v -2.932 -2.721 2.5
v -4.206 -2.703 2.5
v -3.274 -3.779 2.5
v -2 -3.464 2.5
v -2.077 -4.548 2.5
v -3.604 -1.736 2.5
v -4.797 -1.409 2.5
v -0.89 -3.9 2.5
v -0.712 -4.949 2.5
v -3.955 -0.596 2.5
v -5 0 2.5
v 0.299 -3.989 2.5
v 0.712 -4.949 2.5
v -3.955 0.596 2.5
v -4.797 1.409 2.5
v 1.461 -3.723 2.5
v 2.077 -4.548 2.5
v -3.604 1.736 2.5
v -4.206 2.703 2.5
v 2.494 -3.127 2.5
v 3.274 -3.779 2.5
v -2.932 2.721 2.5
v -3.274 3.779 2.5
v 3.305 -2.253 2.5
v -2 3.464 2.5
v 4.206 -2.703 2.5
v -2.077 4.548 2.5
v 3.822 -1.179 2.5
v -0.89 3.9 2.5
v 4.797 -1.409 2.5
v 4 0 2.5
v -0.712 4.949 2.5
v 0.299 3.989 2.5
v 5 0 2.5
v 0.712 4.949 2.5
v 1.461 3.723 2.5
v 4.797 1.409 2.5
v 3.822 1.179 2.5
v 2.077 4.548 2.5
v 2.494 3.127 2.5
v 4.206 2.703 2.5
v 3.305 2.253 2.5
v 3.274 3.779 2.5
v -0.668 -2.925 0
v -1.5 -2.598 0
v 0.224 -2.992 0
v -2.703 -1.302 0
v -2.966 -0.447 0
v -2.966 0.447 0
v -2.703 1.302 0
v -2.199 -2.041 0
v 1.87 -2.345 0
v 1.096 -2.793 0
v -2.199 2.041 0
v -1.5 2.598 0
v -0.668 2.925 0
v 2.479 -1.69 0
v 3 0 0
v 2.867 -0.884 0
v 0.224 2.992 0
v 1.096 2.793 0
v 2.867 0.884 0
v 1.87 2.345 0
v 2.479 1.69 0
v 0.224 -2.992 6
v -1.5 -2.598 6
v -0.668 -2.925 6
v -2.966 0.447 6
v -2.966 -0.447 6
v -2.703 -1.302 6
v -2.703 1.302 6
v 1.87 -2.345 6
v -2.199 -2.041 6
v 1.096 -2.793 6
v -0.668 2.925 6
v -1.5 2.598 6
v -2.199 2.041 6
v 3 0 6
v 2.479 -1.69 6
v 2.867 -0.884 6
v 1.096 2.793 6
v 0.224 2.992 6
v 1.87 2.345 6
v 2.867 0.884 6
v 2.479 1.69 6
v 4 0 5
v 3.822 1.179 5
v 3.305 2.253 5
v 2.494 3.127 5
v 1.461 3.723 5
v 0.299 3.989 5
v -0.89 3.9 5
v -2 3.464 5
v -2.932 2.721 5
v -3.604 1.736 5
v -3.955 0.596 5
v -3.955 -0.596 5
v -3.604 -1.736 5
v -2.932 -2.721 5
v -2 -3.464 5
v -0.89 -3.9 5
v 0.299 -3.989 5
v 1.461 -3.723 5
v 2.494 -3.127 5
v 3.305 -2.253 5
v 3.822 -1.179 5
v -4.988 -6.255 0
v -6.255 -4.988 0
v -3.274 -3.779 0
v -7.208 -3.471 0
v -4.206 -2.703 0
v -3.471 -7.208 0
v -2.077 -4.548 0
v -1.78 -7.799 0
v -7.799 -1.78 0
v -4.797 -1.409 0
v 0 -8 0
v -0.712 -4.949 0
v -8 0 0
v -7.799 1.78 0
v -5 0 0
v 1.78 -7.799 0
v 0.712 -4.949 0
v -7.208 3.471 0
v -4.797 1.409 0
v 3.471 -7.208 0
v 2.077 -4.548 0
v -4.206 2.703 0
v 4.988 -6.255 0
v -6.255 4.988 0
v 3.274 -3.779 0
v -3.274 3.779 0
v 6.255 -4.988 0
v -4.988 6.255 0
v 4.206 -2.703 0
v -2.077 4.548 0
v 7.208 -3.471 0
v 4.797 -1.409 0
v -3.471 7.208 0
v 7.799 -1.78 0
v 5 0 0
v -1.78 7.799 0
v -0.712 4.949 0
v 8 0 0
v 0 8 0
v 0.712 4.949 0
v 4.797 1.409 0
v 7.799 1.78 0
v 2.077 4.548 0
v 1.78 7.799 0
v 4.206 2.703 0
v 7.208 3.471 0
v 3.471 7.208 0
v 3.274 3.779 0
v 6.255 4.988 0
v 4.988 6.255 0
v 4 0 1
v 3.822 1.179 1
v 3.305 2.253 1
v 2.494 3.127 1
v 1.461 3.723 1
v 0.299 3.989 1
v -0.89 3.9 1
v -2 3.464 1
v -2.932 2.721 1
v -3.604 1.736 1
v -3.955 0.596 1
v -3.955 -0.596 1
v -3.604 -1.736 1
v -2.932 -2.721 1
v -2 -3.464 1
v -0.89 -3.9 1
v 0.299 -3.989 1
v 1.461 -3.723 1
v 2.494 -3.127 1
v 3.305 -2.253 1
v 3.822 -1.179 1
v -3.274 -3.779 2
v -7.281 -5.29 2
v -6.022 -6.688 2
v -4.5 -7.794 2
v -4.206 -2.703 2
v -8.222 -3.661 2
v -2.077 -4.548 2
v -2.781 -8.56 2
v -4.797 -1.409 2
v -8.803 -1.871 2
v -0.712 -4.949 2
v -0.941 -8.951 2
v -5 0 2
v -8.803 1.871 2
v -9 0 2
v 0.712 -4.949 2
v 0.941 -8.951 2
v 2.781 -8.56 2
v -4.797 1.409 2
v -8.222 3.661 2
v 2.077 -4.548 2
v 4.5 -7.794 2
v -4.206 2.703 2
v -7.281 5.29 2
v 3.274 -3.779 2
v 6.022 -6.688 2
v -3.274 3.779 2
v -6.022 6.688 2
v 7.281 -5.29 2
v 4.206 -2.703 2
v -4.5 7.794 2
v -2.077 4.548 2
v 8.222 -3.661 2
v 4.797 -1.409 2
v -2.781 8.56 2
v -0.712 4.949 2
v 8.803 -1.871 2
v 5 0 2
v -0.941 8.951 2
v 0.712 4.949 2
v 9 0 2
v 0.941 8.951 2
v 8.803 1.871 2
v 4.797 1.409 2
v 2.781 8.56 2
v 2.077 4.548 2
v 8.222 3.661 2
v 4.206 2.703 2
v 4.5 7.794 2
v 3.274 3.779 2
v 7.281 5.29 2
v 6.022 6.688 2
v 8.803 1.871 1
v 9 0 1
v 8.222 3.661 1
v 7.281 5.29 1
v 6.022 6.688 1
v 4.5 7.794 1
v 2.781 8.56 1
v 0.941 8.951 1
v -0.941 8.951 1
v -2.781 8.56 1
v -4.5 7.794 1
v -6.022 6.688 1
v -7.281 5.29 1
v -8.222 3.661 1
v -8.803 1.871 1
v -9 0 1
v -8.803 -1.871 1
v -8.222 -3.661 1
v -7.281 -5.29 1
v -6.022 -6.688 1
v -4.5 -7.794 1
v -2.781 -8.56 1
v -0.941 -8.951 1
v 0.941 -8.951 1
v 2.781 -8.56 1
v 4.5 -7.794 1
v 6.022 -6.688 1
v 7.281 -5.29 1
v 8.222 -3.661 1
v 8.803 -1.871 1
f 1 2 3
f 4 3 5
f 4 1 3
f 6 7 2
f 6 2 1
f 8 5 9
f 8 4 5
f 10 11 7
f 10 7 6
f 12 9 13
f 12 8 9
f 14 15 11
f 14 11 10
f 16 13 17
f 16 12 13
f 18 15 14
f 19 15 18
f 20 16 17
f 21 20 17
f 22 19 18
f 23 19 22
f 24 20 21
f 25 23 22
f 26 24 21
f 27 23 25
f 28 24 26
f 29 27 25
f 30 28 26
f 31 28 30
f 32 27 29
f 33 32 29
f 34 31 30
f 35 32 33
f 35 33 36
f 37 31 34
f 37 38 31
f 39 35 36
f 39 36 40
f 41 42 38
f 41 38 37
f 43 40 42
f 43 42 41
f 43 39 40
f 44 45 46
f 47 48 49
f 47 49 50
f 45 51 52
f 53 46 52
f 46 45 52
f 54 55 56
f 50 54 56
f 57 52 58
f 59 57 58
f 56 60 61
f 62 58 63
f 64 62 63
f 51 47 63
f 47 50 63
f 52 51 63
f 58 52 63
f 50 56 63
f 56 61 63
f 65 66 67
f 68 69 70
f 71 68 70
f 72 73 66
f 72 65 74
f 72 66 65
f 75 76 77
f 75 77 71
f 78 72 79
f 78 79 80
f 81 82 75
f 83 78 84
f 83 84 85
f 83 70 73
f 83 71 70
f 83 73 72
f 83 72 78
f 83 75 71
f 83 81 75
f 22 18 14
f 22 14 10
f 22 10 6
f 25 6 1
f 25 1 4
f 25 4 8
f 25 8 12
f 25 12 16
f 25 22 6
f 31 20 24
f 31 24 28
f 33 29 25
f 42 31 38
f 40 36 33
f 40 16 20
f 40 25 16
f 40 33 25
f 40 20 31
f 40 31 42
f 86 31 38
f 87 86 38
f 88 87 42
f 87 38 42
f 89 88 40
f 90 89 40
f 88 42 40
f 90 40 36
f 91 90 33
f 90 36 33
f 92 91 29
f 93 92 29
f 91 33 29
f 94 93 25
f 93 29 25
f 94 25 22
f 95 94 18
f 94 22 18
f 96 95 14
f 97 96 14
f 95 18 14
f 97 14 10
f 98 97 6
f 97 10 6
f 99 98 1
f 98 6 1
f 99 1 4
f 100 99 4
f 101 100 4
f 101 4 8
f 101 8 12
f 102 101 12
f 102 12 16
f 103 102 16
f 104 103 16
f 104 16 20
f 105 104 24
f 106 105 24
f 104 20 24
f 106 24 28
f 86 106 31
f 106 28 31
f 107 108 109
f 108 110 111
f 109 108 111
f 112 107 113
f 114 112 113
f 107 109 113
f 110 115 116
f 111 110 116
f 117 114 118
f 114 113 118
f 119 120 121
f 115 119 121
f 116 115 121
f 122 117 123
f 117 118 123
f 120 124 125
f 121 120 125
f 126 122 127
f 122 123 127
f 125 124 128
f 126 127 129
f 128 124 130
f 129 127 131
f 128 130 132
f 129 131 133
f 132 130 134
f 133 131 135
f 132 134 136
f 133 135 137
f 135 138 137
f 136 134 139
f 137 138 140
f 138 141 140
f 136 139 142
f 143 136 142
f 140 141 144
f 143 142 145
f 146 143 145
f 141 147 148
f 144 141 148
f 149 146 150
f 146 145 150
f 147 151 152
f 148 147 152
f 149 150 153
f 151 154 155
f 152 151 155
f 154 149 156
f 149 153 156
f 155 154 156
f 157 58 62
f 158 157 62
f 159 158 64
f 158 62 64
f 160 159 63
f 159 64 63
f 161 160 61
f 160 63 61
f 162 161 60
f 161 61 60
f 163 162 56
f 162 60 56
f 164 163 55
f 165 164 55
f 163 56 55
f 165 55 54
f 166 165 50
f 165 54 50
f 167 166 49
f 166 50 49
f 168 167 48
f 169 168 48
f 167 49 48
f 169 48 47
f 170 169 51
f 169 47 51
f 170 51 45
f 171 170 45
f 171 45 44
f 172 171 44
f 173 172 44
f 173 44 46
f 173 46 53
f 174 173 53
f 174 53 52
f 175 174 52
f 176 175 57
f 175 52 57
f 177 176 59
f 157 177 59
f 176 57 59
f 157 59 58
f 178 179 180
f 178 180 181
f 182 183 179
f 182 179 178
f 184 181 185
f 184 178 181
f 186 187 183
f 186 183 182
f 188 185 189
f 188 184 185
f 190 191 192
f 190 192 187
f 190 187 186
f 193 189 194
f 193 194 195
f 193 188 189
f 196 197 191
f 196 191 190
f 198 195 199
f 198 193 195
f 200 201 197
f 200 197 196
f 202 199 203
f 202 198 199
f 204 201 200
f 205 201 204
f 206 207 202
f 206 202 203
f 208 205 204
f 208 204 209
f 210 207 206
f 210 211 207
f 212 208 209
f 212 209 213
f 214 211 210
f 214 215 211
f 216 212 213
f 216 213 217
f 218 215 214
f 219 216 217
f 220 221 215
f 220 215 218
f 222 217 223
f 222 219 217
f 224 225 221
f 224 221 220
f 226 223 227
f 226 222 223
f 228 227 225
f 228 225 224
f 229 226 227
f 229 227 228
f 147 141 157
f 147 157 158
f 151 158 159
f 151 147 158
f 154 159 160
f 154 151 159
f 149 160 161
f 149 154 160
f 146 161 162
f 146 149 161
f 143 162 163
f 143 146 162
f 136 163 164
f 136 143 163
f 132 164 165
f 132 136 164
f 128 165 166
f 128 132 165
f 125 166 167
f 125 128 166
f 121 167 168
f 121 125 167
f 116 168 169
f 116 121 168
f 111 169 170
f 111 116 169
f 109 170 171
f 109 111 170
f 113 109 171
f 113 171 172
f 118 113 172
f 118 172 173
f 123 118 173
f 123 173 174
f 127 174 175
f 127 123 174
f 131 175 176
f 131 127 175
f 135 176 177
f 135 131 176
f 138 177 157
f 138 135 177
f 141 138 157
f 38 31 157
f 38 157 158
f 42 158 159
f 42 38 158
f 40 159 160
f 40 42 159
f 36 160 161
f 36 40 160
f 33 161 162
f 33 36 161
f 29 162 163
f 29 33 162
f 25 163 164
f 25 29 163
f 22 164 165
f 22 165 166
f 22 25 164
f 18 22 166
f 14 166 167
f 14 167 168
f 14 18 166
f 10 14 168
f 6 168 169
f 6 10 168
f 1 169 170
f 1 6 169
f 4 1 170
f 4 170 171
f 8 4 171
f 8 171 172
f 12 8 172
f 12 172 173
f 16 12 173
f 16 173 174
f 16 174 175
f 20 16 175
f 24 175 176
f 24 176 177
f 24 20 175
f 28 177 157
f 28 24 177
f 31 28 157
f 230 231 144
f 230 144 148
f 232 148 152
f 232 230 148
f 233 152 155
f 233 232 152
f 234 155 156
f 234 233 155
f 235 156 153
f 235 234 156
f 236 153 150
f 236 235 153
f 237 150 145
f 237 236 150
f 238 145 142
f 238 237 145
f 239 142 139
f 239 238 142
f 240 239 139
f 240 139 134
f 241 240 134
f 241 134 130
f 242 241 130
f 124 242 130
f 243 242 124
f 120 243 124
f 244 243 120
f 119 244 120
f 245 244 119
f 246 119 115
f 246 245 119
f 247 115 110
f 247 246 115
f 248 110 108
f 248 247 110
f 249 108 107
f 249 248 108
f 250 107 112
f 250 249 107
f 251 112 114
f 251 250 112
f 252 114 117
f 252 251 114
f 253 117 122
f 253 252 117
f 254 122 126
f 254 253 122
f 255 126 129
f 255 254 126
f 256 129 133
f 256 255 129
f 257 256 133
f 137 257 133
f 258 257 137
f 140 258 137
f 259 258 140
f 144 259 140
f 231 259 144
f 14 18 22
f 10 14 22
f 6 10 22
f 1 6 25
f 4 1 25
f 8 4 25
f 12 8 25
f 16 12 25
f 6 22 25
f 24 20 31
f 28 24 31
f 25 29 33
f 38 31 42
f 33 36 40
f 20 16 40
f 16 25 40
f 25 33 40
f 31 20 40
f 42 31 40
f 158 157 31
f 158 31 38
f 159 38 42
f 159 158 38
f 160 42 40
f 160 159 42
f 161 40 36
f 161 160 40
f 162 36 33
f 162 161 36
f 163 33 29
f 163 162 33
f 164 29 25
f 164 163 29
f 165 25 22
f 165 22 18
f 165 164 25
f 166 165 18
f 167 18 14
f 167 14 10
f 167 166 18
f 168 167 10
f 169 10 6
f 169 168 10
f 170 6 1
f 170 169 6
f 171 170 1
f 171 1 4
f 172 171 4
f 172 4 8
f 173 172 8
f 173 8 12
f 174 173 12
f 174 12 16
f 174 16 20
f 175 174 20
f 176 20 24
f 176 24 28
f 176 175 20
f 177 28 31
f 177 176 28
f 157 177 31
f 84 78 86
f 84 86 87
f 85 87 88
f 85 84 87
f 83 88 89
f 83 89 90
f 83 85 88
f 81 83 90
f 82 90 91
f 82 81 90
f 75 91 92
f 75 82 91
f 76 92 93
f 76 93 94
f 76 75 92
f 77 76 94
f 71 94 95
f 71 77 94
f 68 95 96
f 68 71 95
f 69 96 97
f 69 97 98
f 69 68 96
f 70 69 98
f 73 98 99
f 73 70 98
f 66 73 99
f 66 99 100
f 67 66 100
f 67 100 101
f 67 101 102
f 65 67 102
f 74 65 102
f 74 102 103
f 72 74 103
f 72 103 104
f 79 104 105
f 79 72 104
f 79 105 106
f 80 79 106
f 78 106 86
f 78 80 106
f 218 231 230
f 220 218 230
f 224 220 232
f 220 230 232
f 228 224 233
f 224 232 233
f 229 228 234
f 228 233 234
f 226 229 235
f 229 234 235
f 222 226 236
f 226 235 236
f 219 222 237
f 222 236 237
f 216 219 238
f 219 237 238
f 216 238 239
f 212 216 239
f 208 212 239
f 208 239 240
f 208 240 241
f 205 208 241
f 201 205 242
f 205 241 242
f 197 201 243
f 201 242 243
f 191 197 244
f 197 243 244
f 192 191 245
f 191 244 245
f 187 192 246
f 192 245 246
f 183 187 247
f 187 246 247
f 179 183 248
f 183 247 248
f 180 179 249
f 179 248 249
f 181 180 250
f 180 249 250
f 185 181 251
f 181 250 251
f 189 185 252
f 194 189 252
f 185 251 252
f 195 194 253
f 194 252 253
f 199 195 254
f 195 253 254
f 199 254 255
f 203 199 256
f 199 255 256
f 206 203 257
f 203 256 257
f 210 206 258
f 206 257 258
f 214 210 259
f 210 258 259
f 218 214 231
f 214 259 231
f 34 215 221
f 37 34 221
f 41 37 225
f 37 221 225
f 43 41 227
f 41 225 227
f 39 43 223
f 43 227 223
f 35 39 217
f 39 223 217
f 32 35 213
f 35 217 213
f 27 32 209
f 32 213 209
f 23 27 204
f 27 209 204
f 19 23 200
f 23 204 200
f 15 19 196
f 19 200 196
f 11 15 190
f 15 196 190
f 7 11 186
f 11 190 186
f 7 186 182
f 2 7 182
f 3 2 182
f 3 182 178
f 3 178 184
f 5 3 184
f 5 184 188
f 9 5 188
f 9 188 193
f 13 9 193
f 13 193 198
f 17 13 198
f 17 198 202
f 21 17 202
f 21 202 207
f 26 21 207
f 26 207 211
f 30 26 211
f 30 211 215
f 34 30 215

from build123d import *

# Parameters (mm, degrees)
F0_R      = 9
F0_R_2    = 5
F1_DEPTH  = 2
F0_R_3    = 4
F2_DEPTH  = 2.5
F3_R      = 4
F4_DEPTH  = 3.5
F5_DEPTH  = 2.5
F6_SIZE   = 1
F7_SIZE   = 1
F7_2_SIZE = 1
F7_3_SIZE = 1


with BuildPart() as f1:
    # F0 (on Top) → F1 (new body)
    with BuildSketch(Plane.XY):
        Circle(F0_R)
        Circle(F0_R_2, mode=Mode.SUBTRACT)
    extrude(amount=F1_DEPTH)

    # F0 (on Top) → F2 (join)
    with BuildSketch(Plane.XY):
        Circle(F0_R_2)
        Circle(F0_R_3, mode=Mode.SUBTRACT)
    extrude(amount=F2_DEPTH)

    # F6
    f6_edges = [f1.edges().sort_by_distance(p)[0] for p in [
        (-4, 0, 0),
    ]]
    chamfer(f6_edges, length=F6_SIZE)

    # F7#2
    f7_2_edges = [f1.edges().sort_by_distance(p)[0] for p in [
        (-9, 0, 0),
    ]]
    chamfer(f7_2_edges, length=F7_2_SIZE)


with BuildPart() as f4:
    # F3 (on face) → F4 (new body)
    with BuildSketch(Plane.XY.offset(2.5)):
        Circle(F3_R)
    extrude(amount=F4_DEPTH)

    # F7#3
    f7_3_edges = [f4.edges().sort_by_distance(p)[0] for p in [
        (-4, 0, 6),
    ]]
    chamfer(f7_3_edges, length=F7_3_SIZE)


with BuildPart() as f5:
    # F3 (on face) → F5 (new body)
    with BuildSketch(Plane.XY.offset(2.5)):
        Circle(F3_R)
    extrude(amount=-F5_DEPTH)

    # F7
    f7_edges = [f5.edges().sort_by_distance(p)[0] for p in [
        (-4, 0, 0),
    ]]
    chamfer(f7_edges, length=F7_SIZE)


solid = Compound([f1.part, f4.part, f5.part])
